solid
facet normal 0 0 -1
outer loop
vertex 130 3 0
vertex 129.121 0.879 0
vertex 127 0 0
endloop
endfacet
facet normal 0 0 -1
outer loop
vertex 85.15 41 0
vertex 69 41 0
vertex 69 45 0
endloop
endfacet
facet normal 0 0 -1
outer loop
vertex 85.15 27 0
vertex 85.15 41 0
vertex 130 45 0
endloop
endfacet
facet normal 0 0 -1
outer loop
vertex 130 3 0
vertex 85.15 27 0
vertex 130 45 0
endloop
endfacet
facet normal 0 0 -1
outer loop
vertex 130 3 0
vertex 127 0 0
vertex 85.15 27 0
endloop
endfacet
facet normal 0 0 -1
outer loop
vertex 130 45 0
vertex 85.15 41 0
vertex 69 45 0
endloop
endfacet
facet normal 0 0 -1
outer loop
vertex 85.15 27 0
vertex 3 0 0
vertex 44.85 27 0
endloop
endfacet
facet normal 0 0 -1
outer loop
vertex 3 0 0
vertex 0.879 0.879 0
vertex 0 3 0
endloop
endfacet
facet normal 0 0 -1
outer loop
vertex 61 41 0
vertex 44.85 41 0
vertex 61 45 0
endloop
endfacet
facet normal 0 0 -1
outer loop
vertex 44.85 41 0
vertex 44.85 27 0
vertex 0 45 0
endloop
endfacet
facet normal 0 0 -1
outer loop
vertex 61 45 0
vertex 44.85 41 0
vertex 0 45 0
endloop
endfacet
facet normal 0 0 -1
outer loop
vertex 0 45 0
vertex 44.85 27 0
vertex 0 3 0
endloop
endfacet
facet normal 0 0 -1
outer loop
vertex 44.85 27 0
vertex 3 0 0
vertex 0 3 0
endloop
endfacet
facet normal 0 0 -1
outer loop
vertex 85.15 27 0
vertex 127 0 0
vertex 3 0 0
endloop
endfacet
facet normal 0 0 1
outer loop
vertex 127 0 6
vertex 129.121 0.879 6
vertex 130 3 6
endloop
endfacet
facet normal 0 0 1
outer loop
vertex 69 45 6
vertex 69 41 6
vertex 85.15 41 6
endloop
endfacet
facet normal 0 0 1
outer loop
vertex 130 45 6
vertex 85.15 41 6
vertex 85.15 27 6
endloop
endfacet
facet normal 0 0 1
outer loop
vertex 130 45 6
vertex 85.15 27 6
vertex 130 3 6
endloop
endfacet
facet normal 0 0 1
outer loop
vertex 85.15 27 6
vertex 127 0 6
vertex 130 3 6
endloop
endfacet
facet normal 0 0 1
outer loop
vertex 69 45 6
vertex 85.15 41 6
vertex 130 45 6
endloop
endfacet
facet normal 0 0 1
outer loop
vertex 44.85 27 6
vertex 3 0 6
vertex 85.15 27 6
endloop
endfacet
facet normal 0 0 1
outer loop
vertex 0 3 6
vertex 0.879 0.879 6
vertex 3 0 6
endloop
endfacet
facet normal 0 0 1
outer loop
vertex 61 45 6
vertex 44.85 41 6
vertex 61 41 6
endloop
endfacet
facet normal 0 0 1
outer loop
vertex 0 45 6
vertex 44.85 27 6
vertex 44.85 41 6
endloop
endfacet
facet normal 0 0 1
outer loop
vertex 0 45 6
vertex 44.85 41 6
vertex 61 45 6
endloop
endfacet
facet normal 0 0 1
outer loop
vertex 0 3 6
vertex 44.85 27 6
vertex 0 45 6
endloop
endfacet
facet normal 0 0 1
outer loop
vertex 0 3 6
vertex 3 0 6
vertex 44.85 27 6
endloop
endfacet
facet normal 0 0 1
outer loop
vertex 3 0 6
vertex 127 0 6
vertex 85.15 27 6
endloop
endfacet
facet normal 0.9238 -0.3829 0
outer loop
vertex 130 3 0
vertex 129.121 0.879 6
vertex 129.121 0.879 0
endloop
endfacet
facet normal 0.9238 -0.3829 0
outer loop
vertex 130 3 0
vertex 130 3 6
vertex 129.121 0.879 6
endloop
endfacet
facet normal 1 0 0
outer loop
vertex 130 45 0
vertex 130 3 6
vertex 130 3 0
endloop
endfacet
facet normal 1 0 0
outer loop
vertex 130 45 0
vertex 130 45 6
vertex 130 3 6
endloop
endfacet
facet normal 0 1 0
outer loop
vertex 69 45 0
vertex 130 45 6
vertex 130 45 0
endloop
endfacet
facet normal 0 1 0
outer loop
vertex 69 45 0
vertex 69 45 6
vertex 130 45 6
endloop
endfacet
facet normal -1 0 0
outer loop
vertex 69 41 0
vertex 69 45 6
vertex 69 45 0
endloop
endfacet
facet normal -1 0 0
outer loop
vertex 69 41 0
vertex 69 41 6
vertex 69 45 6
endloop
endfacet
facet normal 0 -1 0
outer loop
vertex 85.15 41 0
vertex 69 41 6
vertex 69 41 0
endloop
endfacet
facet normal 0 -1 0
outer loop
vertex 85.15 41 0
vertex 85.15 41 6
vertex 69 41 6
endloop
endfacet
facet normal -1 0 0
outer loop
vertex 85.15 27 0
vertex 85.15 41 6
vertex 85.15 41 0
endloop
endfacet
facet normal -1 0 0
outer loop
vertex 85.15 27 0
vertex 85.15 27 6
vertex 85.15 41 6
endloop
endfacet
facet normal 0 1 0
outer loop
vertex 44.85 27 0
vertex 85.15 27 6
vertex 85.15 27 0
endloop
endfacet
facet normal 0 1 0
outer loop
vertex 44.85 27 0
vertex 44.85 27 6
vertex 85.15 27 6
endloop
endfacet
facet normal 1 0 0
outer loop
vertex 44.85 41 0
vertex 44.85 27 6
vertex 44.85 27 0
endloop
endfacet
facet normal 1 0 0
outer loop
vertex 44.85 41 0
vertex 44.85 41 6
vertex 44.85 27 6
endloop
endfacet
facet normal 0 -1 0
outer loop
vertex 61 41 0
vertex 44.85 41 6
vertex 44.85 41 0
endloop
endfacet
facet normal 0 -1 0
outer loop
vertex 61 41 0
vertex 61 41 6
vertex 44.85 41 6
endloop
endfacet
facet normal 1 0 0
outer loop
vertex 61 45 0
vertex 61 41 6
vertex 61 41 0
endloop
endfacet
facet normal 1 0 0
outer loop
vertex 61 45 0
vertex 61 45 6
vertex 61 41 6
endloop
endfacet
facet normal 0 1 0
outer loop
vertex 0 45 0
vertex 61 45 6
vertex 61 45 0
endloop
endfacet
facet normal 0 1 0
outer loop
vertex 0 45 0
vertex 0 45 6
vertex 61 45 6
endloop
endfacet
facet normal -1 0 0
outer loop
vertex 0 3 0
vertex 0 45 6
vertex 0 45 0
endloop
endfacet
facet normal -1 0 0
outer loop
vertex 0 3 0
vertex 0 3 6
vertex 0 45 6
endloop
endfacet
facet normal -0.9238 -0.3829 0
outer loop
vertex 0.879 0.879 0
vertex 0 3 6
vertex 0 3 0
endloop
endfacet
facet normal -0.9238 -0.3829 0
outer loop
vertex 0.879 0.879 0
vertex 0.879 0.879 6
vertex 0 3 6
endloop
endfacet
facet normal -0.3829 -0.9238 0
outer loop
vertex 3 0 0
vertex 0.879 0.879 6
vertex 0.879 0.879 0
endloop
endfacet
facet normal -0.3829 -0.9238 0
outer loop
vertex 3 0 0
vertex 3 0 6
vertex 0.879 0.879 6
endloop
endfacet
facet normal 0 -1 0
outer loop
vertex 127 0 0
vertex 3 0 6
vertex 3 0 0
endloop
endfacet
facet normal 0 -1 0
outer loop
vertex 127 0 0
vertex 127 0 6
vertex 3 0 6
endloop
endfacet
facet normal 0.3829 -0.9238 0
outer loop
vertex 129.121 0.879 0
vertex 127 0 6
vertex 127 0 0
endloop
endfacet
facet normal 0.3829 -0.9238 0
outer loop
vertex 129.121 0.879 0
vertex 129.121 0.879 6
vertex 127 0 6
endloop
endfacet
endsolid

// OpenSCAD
$fn = 32;

// ----------------------------------------------------------------------
// Window plate: 130 x 45 mm, 1 open windows
// ----------------------------------------------------------------------

// --- parameters (mm) ---
profile_height = 6;       // extrusion height
profile_points = 16;      // points of the closed outline

profile = [[0, 3], [0.879, 0.879], [3, 0], [127, 0], [129.121, 0.879], [130, 3], [130, 45], [69, 45], [69, 41], [85.15, 41], [85.15, 27], [44.85, 27], [44.85, 41], [61, 41], [61, 45], [0, 45]];  // single closed polygon, 16 points, counter clockwise

// --- the one profile operation ---
linear_extrude(height = profile_height) polygon(points = profile);
